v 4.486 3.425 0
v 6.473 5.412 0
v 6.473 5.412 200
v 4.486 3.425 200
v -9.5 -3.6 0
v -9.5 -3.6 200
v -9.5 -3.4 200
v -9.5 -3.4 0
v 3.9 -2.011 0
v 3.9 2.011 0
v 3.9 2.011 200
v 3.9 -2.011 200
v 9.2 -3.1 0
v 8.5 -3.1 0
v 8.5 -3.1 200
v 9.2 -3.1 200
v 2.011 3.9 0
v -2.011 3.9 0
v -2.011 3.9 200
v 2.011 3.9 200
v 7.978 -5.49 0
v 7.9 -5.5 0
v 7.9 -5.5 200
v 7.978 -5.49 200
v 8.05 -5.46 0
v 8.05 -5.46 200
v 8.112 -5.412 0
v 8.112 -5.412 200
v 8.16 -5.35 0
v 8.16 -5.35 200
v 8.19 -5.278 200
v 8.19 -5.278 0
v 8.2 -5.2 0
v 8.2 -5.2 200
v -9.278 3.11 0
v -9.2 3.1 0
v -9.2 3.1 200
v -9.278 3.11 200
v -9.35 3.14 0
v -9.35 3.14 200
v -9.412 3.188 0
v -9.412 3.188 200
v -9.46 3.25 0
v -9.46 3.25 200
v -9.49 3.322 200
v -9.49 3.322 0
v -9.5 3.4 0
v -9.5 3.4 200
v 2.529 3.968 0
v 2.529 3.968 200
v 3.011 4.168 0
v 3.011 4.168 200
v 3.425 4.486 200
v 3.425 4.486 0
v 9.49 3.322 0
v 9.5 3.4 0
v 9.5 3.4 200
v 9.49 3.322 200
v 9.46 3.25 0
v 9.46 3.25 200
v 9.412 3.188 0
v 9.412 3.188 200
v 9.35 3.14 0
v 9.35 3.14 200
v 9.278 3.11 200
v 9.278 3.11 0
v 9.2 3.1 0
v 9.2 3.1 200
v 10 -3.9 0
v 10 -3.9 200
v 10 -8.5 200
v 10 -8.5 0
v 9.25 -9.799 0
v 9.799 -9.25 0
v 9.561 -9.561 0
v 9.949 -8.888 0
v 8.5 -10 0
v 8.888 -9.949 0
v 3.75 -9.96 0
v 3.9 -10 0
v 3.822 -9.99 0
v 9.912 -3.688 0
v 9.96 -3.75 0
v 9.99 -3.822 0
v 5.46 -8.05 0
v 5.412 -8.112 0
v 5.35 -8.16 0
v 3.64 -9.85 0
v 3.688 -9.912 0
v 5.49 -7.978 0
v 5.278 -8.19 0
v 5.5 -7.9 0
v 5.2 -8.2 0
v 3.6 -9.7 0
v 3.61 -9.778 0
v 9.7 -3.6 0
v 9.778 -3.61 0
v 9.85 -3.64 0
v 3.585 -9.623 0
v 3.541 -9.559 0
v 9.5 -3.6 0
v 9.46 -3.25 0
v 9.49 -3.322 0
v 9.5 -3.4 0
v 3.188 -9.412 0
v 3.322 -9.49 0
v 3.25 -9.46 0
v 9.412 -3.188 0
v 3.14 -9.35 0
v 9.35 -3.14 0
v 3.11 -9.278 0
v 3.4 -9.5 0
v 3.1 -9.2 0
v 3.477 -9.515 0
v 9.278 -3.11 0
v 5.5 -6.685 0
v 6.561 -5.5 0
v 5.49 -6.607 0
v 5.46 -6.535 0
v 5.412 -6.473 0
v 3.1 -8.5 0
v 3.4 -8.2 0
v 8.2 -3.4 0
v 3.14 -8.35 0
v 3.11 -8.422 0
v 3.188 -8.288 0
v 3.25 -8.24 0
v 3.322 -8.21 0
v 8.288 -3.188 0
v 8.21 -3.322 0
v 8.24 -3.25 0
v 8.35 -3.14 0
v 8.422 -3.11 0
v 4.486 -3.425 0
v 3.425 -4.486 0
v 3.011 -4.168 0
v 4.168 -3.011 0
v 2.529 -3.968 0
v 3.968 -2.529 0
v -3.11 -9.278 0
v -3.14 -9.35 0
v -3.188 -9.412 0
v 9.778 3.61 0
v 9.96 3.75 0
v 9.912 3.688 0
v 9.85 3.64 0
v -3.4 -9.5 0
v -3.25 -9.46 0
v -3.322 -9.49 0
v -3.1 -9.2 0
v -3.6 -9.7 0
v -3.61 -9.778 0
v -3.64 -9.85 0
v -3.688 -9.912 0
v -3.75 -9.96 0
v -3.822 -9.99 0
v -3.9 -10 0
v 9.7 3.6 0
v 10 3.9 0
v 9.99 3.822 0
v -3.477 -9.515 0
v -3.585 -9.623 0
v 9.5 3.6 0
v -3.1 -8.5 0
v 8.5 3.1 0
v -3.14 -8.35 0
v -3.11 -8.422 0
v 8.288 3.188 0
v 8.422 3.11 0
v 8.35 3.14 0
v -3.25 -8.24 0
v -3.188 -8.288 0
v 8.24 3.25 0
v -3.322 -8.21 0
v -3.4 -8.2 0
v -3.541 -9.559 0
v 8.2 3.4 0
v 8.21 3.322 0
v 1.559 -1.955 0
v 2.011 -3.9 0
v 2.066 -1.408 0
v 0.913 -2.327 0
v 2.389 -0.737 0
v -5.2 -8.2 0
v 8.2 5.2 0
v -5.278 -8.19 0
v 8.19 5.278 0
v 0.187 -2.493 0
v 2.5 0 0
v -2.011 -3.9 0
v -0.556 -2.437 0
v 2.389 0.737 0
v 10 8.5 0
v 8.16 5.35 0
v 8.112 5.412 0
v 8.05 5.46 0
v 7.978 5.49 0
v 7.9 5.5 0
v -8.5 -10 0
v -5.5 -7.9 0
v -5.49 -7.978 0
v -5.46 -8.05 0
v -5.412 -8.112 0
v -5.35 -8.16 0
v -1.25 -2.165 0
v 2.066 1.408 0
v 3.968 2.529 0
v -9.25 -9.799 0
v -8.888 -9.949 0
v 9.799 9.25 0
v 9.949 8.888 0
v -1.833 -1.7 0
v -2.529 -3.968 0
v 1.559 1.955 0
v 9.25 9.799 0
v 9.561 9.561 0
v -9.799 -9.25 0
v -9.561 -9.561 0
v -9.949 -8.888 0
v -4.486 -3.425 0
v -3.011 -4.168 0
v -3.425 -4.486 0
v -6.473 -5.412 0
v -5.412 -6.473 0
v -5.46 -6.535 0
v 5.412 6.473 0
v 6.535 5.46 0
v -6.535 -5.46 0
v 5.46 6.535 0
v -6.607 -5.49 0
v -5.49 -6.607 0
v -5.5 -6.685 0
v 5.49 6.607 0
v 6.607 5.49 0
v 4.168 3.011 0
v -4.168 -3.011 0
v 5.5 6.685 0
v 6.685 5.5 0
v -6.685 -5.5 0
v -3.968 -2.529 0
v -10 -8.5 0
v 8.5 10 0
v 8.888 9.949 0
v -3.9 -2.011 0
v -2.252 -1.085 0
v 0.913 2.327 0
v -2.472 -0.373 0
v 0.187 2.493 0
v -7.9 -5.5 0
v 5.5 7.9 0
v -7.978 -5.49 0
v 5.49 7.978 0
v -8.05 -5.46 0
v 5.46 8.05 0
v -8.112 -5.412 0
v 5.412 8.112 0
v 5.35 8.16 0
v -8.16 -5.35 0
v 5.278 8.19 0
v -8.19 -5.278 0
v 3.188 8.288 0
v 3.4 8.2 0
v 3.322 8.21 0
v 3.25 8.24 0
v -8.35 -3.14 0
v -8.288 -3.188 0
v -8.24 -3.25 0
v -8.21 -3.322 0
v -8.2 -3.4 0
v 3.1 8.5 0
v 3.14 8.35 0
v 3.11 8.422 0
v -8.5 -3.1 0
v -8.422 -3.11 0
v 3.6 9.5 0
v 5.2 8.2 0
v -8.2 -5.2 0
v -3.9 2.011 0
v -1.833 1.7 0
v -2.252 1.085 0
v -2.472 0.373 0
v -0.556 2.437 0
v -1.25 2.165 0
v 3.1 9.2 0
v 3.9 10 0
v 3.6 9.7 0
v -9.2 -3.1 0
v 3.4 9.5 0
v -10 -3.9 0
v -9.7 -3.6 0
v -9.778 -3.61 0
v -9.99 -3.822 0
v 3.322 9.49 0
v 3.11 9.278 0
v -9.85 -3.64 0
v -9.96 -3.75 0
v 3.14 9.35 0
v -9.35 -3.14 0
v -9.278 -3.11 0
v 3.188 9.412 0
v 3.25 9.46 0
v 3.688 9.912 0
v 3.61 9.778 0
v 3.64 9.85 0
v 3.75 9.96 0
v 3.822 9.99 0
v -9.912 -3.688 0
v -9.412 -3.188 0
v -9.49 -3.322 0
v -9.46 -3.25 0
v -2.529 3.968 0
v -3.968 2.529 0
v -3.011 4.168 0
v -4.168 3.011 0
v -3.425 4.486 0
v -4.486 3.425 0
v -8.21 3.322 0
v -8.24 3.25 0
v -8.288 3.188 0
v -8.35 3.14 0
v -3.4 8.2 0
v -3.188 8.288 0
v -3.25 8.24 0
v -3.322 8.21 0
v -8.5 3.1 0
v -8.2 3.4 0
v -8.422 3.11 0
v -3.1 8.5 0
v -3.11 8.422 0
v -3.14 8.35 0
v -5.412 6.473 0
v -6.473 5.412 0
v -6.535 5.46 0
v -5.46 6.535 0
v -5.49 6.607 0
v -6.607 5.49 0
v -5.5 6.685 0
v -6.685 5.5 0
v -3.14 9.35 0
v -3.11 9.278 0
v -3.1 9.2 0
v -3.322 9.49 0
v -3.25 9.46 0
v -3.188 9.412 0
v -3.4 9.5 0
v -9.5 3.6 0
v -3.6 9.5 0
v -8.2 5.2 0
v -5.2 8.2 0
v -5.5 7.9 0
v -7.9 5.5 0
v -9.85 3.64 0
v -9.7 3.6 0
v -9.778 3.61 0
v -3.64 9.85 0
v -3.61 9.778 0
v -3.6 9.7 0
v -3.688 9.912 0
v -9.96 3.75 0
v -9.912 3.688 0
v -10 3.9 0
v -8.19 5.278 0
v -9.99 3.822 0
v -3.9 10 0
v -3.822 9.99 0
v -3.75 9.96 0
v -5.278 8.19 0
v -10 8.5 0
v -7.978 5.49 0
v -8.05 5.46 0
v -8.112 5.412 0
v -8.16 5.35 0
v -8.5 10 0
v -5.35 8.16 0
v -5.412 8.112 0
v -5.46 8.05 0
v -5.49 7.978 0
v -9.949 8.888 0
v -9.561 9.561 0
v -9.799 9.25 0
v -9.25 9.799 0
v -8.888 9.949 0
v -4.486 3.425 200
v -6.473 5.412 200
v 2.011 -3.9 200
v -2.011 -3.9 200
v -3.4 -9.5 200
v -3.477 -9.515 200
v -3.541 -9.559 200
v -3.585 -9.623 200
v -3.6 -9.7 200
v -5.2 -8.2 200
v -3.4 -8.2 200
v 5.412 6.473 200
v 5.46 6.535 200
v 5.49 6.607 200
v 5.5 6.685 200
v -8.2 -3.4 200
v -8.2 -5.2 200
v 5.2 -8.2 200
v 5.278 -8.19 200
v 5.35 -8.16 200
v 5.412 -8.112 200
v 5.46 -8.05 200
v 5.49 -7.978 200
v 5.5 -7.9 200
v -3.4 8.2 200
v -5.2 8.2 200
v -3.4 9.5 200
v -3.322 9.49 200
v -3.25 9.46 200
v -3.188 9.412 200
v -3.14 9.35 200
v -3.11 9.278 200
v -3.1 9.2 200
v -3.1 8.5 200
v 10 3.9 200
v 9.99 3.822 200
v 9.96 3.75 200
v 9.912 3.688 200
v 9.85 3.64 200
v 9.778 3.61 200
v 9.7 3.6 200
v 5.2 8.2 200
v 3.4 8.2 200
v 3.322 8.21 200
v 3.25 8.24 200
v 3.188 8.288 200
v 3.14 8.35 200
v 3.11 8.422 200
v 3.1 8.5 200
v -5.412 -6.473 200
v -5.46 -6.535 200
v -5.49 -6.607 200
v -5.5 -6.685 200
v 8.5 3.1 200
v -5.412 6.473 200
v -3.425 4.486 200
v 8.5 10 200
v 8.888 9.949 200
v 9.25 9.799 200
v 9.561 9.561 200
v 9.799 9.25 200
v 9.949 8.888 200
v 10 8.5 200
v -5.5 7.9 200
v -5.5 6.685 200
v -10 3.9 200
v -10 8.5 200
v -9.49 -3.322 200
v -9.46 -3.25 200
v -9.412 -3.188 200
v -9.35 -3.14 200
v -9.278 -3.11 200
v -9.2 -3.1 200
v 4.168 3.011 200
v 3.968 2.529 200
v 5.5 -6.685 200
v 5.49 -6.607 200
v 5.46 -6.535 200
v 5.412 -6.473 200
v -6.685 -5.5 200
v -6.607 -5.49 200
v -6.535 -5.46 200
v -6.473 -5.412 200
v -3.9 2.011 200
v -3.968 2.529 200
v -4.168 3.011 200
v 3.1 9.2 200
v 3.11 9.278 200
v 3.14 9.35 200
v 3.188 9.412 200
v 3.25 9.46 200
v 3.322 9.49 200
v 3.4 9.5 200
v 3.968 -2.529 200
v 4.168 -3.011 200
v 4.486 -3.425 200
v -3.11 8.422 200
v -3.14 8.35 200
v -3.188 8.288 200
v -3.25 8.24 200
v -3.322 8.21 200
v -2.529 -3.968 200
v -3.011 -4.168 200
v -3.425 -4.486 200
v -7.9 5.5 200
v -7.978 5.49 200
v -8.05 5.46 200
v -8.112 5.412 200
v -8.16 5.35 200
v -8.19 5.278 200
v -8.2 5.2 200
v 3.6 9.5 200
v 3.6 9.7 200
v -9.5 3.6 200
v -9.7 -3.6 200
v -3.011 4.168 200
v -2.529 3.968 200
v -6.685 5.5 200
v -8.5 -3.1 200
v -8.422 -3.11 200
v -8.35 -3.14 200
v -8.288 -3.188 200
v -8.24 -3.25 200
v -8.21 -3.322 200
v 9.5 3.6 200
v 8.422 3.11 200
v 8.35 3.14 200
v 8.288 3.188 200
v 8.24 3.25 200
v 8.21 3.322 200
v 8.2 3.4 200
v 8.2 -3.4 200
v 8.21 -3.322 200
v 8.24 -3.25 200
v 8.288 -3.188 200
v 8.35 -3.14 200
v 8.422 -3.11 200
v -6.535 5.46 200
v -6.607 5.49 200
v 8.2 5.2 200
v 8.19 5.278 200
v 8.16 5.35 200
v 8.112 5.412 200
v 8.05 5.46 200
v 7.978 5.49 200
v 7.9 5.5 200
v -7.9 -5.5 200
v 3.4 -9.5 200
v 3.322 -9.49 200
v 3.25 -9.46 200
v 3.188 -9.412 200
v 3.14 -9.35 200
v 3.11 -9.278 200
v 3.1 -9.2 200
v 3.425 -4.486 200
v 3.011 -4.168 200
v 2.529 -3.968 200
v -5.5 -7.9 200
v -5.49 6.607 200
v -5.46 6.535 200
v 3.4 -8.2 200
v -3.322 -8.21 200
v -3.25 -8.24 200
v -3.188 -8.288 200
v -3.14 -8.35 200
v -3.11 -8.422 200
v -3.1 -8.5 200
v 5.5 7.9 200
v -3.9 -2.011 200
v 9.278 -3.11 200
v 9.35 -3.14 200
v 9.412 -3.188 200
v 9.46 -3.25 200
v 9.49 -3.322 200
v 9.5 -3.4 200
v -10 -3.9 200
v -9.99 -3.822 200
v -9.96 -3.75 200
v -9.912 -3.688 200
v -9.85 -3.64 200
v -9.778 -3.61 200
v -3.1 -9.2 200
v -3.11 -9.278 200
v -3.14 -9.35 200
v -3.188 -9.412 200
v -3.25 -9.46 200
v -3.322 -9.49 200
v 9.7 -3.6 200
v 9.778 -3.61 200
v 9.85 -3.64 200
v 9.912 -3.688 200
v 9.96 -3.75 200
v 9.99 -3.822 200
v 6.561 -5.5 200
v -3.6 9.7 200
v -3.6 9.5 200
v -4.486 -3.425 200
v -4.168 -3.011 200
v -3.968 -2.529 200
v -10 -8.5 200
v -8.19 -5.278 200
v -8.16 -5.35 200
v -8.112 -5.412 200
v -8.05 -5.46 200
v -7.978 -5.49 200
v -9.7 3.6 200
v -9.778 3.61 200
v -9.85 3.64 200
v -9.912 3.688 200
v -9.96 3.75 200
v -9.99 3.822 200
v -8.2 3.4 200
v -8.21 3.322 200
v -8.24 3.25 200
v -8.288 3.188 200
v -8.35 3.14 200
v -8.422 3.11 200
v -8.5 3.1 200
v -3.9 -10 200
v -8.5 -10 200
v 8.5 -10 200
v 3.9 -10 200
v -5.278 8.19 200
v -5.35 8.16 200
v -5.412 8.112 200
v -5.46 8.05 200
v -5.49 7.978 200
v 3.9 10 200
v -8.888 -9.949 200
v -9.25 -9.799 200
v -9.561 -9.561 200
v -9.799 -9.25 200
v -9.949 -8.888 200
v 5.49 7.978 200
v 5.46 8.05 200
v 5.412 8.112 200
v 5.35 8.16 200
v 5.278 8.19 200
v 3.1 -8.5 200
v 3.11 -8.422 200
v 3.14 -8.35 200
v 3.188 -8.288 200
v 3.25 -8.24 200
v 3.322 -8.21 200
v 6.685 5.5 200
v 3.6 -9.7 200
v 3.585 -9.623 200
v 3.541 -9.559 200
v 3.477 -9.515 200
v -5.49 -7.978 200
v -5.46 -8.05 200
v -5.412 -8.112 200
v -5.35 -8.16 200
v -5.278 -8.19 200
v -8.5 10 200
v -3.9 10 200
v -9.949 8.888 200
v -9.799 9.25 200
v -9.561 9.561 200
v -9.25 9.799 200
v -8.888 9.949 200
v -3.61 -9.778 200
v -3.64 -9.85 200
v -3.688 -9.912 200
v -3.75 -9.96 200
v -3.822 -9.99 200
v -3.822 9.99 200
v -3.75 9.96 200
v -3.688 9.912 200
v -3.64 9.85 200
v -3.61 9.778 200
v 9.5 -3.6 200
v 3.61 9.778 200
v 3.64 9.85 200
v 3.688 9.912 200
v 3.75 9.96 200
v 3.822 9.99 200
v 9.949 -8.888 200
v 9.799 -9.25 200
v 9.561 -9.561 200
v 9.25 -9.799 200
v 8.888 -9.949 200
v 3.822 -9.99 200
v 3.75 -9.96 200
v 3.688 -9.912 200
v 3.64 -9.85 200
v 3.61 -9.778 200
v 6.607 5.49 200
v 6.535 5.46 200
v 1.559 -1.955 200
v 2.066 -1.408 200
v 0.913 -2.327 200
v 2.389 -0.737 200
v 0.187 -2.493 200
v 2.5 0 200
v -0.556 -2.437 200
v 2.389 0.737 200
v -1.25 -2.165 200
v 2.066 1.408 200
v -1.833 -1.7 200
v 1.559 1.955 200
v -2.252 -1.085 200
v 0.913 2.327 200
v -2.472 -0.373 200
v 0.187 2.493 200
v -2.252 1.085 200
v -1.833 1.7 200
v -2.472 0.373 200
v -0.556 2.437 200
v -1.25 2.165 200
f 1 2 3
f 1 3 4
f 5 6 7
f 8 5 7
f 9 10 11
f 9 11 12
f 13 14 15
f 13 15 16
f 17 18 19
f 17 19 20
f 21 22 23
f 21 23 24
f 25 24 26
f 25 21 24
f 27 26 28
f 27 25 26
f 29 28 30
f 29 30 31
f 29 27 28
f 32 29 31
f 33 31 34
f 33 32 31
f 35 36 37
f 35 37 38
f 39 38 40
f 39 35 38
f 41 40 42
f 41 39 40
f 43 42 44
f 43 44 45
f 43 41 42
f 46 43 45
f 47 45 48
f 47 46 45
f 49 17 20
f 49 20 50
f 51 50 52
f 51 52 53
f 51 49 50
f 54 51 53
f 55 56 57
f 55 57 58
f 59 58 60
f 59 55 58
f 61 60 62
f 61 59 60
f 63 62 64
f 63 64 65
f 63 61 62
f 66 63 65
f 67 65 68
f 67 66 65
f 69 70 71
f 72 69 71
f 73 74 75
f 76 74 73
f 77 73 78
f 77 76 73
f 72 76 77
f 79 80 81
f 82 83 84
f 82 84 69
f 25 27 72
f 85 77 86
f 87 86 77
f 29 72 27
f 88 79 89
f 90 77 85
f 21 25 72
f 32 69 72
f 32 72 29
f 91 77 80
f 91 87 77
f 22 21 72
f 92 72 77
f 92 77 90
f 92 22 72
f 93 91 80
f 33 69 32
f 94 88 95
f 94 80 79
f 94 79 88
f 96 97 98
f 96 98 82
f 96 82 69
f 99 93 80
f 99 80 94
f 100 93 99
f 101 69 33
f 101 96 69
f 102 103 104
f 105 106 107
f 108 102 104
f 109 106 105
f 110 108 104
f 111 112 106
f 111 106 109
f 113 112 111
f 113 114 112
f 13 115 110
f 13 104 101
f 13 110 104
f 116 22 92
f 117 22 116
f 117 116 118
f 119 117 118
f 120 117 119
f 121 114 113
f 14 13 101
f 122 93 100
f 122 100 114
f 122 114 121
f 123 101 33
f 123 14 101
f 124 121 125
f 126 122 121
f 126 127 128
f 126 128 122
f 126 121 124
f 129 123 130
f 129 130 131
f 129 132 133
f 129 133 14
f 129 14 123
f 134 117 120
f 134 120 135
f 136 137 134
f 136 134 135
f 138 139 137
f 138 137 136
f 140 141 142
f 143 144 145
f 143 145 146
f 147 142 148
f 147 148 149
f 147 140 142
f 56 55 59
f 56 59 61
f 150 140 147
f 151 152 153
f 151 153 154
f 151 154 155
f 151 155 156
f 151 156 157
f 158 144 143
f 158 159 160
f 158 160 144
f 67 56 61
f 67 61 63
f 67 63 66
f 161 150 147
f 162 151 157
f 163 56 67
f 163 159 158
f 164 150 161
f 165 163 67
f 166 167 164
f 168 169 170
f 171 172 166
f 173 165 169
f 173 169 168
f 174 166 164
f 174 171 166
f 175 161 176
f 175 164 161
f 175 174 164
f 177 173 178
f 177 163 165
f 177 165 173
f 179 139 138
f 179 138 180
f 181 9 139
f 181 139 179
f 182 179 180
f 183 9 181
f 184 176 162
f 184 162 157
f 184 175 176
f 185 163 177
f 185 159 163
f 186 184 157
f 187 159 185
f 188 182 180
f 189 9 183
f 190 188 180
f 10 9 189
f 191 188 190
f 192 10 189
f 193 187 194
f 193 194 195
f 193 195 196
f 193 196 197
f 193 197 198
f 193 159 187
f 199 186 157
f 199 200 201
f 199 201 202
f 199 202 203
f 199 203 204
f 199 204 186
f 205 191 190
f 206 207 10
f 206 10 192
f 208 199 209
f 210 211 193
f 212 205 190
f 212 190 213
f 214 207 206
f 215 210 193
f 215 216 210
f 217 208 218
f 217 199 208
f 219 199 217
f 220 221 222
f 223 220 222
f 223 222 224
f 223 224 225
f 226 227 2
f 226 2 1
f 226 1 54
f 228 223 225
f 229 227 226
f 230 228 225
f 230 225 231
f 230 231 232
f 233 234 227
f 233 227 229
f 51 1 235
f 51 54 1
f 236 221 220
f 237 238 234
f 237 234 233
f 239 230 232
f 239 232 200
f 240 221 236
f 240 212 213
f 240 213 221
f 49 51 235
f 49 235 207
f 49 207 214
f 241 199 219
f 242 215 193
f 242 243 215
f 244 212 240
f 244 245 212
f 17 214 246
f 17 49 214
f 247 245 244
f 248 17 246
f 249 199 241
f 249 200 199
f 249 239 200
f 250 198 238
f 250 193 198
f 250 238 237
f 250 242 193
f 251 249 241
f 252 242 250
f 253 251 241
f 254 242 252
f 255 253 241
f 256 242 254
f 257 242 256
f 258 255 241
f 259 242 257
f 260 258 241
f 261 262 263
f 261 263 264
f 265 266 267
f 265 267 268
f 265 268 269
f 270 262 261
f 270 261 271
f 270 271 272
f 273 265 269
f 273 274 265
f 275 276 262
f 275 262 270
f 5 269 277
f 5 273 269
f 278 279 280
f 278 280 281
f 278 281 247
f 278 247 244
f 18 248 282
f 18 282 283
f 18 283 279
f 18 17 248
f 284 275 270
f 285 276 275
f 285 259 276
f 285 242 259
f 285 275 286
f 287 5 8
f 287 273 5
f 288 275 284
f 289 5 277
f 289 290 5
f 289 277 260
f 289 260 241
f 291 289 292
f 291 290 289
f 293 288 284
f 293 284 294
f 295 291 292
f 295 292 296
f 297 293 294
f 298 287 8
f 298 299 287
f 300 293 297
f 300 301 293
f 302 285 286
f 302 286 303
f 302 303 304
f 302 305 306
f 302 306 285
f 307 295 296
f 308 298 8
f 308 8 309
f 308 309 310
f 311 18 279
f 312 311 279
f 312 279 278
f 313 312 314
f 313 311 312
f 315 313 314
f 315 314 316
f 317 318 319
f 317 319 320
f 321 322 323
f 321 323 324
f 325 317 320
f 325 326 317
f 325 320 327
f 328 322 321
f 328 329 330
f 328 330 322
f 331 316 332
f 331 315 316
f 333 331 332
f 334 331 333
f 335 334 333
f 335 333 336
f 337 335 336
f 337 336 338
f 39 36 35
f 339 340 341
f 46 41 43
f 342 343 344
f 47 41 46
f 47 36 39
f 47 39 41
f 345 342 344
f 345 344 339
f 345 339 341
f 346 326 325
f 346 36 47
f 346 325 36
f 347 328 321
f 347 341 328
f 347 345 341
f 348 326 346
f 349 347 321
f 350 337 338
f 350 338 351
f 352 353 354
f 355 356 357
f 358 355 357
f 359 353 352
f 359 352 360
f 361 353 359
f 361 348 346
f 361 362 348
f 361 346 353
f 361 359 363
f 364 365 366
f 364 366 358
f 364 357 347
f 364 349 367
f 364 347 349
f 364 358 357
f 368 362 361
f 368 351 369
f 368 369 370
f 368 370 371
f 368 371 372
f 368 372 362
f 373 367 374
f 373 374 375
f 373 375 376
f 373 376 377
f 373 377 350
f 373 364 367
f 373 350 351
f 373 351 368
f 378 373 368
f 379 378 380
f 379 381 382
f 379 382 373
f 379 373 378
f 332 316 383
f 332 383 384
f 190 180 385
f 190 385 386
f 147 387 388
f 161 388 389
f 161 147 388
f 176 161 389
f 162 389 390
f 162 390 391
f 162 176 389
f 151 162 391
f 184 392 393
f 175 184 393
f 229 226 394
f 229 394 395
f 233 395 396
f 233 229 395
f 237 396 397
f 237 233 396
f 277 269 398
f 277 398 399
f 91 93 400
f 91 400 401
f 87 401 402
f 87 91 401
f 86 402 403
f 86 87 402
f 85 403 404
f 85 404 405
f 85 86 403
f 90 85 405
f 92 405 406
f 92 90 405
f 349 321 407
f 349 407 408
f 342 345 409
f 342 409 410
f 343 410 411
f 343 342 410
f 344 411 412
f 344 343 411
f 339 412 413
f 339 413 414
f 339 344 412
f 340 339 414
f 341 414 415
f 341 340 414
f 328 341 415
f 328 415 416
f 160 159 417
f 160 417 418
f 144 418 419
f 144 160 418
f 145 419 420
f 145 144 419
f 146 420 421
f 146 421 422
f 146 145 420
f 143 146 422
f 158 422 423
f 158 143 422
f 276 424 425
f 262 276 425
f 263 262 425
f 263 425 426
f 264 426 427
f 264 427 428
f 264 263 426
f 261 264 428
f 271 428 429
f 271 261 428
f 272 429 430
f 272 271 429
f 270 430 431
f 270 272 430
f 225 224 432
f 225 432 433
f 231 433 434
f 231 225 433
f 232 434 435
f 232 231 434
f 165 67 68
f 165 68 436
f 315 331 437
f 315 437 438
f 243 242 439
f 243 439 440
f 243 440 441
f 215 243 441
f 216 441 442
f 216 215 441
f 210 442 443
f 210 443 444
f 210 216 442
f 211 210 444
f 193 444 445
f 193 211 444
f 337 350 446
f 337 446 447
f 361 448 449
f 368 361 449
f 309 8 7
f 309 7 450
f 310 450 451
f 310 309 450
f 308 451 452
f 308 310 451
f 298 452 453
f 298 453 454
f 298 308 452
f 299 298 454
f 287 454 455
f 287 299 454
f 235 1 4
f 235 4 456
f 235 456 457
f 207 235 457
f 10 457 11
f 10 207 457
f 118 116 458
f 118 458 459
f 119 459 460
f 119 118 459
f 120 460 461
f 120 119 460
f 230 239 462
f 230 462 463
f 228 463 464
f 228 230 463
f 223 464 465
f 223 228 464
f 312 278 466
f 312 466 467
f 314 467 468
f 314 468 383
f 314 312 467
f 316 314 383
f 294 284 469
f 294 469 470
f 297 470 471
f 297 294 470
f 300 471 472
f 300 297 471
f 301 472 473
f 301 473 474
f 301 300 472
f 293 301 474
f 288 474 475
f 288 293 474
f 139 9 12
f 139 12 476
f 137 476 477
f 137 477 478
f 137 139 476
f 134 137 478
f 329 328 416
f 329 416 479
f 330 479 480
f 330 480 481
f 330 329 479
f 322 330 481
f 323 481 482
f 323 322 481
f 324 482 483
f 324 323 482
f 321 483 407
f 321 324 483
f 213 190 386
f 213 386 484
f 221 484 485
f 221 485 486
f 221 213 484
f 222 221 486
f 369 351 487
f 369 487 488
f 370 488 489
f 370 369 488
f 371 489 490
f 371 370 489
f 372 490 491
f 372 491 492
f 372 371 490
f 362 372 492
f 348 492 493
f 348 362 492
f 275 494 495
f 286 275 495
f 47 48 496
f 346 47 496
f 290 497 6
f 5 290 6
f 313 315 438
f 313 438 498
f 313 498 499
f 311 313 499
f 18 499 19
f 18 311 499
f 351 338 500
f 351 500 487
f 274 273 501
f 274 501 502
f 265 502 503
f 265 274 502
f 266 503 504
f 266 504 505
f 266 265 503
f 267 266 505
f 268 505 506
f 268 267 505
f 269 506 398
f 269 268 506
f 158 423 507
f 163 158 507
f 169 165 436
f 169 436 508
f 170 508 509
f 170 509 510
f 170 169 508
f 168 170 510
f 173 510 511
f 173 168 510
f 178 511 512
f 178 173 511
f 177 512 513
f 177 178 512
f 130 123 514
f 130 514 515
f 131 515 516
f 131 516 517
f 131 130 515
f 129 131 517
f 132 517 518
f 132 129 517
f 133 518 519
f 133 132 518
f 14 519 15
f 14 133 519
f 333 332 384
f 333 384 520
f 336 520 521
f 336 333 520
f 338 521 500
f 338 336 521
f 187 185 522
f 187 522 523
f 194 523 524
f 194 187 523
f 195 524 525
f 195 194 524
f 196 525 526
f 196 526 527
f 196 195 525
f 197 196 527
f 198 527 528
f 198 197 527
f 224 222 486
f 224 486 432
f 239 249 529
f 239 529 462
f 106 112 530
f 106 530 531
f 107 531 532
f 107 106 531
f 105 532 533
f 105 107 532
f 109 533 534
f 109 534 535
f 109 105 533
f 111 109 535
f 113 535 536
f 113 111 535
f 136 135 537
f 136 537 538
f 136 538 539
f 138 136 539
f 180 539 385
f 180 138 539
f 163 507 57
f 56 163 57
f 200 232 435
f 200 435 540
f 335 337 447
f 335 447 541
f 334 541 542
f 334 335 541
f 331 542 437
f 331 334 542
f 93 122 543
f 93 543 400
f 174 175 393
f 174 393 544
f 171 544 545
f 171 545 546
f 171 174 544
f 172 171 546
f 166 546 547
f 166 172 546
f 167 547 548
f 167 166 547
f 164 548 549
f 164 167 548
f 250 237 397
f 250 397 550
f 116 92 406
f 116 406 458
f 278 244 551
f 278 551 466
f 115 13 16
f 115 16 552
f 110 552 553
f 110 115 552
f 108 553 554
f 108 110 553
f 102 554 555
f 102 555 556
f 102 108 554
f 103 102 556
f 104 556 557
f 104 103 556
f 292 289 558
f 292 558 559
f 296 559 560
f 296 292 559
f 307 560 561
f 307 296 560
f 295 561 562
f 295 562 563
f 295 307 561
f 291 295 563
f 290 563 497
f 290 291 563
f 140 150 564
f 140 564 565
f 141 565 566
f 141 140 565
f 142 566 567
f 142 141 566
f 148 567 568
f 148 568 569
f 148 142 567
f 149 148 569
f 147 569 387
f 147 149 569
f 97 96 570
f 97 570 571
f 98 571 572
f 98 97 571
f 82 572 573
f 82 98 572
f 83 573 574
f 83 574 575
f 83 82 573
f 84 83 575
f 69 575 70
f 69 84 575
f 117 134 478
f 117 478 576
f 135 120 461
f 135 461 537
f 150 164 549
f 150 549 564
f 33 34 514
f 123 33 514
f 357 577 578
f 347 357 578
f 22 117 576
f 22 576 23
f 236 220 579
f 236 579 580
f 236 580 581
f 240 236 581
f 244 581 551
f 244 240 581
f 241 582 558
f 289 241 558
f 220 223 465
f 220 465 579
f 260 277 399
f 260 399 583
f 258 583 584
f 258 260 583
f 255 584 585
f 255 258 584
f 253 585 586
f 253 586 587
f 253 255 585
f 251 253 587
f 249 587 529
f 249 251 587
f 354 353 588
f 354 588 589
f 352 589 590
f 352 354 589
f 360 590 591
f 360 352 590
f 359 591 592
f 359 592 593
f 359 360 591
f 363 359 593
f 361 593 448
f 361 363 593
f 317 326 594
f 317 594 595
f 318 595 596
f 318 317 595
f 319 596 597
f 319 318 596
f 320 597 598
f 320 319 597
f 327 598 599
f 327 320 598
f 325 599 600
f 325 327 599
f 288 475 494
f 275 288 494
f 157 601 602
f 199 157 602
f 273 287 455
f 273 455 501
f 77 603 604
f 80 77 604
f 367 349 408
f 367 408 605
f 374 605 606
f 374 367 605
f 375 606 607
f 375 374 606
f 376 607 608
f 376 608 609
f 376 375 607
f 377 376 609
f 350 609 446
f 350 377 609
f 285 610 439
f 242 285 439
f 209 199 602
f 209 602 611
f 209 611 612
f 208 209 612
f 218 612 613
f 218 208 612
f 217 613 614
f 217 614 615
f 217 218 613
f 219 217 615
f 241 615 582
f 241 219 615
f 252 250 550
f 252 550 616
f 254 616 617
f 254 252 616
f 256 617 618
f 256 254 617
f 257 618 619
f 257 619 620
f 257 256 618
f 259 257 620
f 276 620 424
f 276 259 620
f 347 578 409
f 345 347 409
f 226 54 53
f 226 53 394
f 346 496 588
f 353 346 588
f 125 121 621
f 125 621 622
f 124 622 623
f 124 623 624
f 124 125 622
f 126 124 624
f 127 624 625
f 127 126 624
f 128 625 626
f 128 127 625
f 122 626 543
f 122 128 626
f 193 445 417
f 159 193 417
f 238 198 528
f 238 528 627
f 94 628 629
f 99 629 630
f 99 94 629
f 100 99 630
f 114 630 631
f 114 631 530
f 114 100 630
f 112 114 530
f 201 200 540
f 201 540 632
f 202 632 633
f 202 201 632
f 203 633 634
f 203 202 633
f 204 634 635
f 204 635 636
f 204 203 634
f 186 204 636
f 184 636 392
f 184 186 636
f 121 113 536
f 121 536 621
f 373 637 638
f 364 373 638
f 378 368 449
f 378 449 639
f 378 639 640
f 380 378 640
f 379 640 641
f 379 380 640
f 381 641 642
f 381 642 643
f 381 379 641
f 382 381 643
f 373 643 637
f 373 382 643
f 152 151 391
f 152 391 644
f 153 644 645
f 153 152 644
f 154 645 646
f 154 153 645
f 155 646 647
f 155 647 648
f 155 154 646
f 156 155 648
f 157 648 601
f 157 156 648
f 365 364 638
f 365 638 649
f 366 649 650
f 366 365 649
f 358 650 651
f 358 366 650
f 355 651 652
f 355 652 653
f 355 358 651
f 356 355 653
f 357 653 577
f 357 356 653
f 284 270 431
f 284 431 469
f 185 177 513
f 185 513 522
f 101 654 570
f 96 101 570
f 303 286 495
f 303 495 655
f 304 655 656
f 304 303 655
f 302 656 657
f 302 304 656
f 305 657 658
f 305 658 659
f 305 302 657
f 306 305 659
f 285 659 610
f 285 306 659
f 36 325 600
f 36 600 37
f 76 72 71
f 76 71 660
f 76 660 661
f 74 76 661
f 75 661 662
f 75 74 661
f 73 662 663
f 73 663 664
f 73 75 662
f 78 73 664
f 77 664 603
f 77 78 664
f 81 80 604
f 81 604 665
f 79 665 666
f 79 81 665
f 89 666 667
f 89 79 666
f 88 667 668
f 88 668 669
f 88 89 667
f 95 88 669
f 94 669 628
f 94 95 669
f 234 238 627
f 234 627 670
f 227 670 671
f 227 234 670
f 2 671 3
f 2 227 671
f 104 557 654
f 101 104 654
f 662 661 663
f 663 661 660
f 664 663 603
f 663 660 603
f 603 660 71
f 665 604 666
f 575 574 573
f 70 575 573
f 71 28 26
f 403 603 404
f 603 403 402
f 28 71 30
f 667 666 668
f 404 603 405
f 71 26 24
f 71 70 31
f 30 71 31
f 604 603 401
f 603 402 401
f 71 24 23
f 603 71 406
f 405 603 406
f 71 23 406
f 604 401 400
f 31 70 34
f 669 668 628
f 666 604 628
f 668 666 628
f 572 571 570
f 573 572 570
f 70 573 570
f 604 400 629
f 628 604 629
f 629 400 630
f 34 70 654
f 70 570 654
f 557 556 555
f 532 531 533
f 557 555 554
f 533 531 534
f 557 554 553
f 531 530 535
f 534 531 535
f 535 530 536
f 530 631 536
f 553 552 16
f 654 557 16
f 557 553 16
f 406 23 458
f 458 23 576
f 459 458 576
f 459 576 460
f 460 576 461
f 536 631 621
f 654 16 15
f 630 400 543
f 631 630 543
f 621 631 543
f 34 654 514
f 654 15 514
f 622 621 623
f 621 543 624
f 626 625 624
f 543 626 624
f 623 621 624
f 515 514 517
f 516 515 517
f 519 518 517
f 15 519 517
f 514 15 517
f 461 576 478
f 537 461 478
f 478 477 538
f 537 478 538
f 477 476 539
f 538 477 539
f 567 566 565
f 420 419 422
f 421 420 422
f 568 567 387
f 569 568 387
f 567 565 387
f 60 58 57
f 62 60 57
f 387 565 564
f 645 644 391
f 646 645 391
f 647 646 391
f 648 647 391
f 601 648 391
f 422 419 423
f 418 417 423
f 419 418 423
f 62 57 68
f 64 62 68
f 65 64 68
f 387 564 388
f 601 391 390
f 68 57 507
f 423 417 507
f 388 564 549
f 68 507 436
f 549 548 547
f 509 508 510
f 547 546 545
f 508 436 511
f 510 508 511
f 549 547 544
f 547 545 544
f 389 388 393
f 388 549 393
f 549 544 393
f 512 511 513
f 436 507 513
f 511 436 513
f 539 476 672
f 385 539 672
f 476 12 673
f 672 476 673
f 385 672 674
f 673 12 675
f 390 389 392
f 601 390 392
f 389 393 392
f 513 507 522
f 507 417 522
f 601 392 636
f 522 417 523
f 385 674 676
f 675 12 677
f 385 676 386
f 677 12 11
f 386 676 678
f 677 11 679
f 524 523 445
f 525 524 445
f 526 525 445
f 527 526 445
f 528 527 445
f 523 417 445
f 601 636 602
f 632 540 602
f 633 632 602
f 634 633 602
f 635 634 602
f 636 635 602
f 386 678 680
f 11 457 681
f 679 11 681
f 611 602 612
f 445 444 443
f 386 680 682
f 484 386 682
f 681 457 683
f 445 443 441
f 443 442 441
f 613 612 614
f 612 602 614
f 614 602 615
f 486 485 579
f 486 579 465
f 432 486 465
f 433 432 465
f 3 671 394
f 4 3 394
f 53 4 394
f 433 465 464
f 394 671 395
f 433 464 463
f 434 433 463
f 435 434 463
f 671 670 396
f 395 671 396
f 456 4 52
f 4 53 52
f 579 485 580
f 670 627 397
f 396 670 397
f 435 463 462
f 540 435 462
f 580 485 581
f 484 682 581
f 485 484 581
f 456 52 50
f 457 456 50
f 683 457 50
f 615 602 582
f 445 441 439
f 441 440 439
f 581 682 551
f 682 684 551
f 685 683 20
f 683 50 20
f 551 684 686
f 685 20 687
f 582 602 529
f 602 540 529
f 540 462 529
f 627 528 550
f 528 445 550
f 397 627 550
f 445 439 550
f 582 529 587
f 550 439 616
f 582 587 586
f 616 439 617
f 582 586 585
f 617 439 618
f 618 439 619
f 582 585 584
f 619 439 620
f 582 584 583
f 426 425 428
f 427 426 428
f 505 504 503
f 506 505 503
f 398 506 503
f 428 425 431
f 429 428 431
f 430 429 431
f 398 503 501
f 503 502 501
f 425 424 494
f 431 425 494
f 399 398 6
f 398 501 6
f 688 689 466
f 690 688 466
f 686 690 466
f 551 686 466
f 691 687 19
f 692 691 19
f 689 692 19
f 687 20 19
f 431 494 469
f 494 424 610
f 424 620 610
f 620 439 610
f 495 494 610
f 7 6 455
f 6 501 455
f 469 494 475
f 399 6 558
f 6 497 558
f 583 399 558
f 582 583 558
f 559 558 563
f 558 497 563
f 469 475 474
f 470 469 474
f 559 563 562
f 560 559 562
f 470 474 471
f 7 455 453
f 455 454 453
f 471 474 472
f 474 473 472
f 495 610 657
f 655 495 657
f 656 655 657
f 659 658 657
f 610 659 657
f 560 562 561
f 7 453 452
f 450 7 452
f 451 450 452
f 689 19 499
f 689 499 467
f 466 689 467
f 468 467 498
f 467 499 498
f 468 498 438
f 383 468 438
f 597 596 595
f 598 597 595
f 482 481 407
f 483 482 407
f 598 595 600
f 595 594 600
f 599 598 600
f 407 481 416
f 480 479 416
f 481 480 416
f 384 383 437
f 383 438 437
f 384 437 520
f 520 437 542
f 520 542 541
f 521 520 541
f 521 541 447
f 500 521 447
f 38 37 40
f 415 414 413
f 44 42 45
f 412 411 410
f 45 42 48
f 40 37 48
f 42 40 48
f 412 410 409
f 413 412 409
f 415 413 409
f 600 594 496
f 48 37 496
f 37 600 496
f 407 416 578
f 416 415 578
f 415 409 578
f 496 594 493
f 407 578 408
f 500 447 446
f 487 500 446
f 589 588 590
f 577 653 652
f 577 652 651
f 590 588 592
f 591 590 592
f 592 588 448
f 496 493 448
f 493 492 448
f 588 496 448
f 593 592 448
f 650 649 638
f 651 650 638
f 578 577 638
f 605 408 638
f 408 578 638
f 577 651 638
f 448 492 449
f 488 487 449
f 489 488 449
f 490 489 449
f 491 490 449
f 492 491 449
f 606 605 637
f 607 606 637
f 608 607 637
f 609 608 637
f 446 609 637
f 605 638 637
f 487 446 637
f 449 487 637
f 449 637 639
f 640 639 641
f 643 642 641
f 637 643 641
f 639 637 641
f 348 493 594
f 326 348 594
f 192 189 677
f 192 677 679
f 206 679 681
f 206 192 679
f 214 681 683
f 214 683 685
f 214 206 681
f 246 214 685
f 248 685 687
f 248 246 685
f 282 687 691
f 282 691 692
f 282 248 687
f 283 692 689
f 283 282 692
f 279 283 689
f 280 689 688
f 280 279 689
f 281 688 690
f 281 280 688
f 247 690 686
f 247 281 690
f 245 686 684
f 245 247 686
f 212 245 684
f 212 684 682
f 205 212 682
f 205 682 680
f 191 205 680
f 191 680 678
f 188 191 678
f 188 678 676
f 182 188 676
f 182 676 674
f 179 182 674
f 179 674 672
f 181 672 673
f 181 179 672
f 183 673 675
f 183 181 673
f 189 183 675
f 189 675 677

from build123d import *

# Parameters (mm, degrees)
SKETCH_1_R      = 2.5
EXTRUDE_1_DEPTH = 200


with BuildPart() as part:
    # 草图1 → 凸台-拉伸1 (new body)
    with BuildSketch(Plane.XY):
        with BuildLine():
            Line((3.9, 0), (3.9, -2.010912703))
            ThreePointArc((3.9, -2.010912703), (4.052240935, -2.776279568), (4.485786438, -3.425126266))
            Line((4.485786438, -3.425126266), (6.560660172, -5.5))
            Line((6.560660172, -5.5), (7.9, -5.5))
            ThreePointArc((7.9, -5.5), (8.112132034, -5.412132034), (8.2, -5.2))
            Line((8.2, -5.2), (8.2, -3.4))
            ThreePointArc((8.2, -3.4), (8.287867966, -3.187867966), (8.5, -3.1))
            Line((8.5, -3.1), (9.2, -3.1))
            ThreePointArc((9.2, -3.1), (9.412132034, -3.187867966), (9.5, -3.4))
            Line((9.5, -3.4), (9.5, -3.6))
            Line((9.5, -3.6), (9.7, -3.6))
            ThreePointArc((9.7, -3.6), (9.912132034, -3.687867966), (10, -3.9))
            Line((10, -3.9), (10, -8.5))
            ThreePointArc((10, -8.5), (9.560660172, -9.560660172), (8.5, -10))
            Line((8.5, -10), (3.9, -10))
            ThreePointArc((3.9, -10), (3.687867966, -9.912132034), (3.6, -9.7))
            ThreePointArc((3.6, -9.7), (3.541421356, -9.558578644), (3.4, -9.5))
            ThreePointArc((3.4, -9.5), (3.187867966, -9.412132034), (3.1, -9.2))
            Line((3.1, -9.2), (3.1, -8.5))
            ThreePointArc((3.1, -8.5), (3.187867966, -8.287867966), (3.4, -8.2))
            Line((3.4, -8.2), (5.2, -8.2))
            ThreePointArc((5.2, -8.2), (5.412132034, -8.112132034), (5.5, -7.9))
            Line((5.5, -7.9), (5.5, -6.68492424))
            ThreePointArc((5.5, -6.68492424), (5.47716386, -6.570119211), (5.412132034, -6.472792206))
            Line((5.412132034, -6.472792206), (3.425126266, -4.485786438))
            ThreePointArc((3.425126266, -4.485786438), (2.776279568, -4.052240935), (2.010912703, -3.9))
            Line((2.010912703, -3.9), (0, -3.9))
            Line((0, -3.9), (-2.010912703, -3.9))
            ThreePointArc((-2.010912703, -3.9), (-2.776279568, -4.052240935), (-3.425126266, -4.485786438))
            Line((-3.425126266, -4.485786438), (-5.412132034, -6.472792206))
            ThreePointArc((-5.412132034, -6.472792206), (-5.47716386, -6.570119211), (-5.5, -6.68492424))
            Line((-5.5, -6.68492424), (-5.5, -7.9))
            ThreePointArc((-5.5, -7.9), (-5.412132034, -8.112132034), (-5.2, -8.2))
            Line((-5.2, -8.2), (-3.4, -8.2))
            ThreePointArc((-3.4, -8.2), (-3.187867966, -8.287867966), (-3.1, -8.5))
            Line((-3.1, -8.5), (-3.1, -9.2))
            ThreePointArc((-3.1, -9.2), (-3.187867966, -9.412132034), (-3.4, -9.5))
            ThreePointArc((-3.4, -9.5), (-3.541421356, -9.558578644), (-3.6, -9.7))
            ThreePointArc((-3.6, -9.7), (-3.687867966, -9.912132034), (-3.9, -10))
            Line((-3.9, -10), (-8.5, -10))
            ThreePointArc((-8.5, -10), (-9.560660172, -9.560660172), (-10, -8.5))
            Line((-10, -8.5), (-10, -3.9))
            ThreePointArc((-10, -3.9), (-9.912132034, -3.687867966), (-9.7, -3.6))
            Line((-9.7, -3.6), (-9.5, -3.6))
            Line((-9.5, -3.6), (-9.5, -3.4))
            ThreePointArc((-9.5, -3.4), (-9.412132034, -3.187867966), (-9.2, -3.1))
            Line((-9.2, -3.1), (-8.5, -3.1))
            ThreePointArc((-8.5, -3.1), (-8.287867965, -3.187867966), (-8.2, -3.4))
            Line((-8.2, -3.4), (-8.2, -5.2))
            ThreePointArc((-8.2, -5.2), (-8.112132034, -5.412132034), (-7.9, -5.5))
            Line((-7.9, -5.5), (-6.68492424, -5.5))
            ThreePointArc((-6.68492424, -5.5), (-6.570119211, -5.47716386), (-6.472792206, -5.412132034))
            Line((-6.472792206, -5.412132034), (-4.485786438, -3.425126266))
            ThreePointArc((-4.485786438, -3.425126266), (-4.052240935, -2.776279568), (-3.9, -2.010912703))
            Line((-3.9, -2.010912703), (-3.9, 0))
            Line((-3.9, 0), (-3.9, 2.010912703))
            ThreePointArc((-3.9, 2.010912703), (-4.052240935, 2.776279568), (-4.485786438, 3.425126266))
            Line((-4.485786438, 3.425126266), (-6.472792206, 5.412132034))
            ThreePointArc((-6.472792206, 5.412132034), (-6.570119211, 5.47716386), (-6.68492424, 5.5))
            Line((-6.68492424, 5.5), (-7.9, 5.5))
            ThreePointArc((-7.9, 5.5), (-8.112132034, 5.412132034), (-8.2, 5.2))
            Line((-8.2, 5.2), (-8.2, 3.4))
            ThreePointArc((-8.2, 3.4), (-8.287867965, 3.187867966), (-8.5, 3.1))
            Line((-8.5, 3.1), (-9.2, 3.1))
            ThreePointArc((-9.2, 3.1), (-9.412132034, 3.187867966), (-9.5, 3.4))
            Line((-9.5, 3.4), (-9.5, 3.6))
            Line((-9.5, 3.6), (-9.7, 3.6))
            ThreePointArc((-9.7, 3.6), (-9.912132034, 3.687867966), (-10, 3.9))
            Line((-10, 3.9), (-10, 8.5))
            ThreePointArc((-10, 8.5), (-9.560660172, 9.560660172), (-8.5, 10))
            Line((-8.5, 10), (-3.9, 10))
            ThreePointArc((-3.9, 10), (-3.687867966, 9.912132034), (-3.6, 9.7))
            Line((-3.6, 9.7), (-3.6, 9.5))
            Line((-3.6, 9.5), (-3.4, 9.5))
            ThreePointArc((-3.4, 9.5), (-3.187867966, 9.412132034), (-3.1, 9.2))
            Line((-3.1, 9.2), (-3.1, 8.5))
            ThreePointArc((-3.1, 8.5), (-3.187867966, 8.287867966), (-3.4, 8.2))
            Line((-3.4, 8.2), (-5.2, 8.2))
            ThreePointArc((-5.2, 8.2), (-5.412132034, 8.112132034), (-5.5, 7.9))
            Line((-5.5, 7.9), (-5.5, 6.68492424))
            ThreePointArc((-5.5, 6.68492424), (-5.47716386, 6.570119211), (-5.412132034, 6.472792206))
            Line((-5.412132034, 6.472792206), (-3.425126266, 4.485786438))
            ThreePointArc((-3.425126266, 4.485786438), (-2.776279568, 4.052240935), (-2.010912703, 3.9))
            Line((-2.010912703, 3.9), (0, 3.9))
            Line((0, 3.9), (2.010912703, 3.9))
            ThreePointArc((2.010912703, 3.9), (2.776279568, 4.052240935), (3.425126266, 4.485786438))
            Line((3.425126266, 4.485786438), (5.412132034, 6.472792206))
            ThreePointArc((5.412132034, 6.472792206), (5.47716386, 6.570119211), (5.5, 6.68492424))
            Line((5.5, 6.68492424), (5.5, 7.9))
            ThreePointArc((5.5, 7.9), (5.412132034, 8.112132034), (5.2, 8.2))
            Line((5.2, 8.2), (3.4, 8.2))
            ThreePointArc((3.4, 8.2), (3.187867966, 8.287867966), (3.1, 8.5))
            Line((3.1, 8.5), (3.1, 9.2))
            ThreePointArc((3.1, 9.2), (3.187867966, 9.412132034), (3.4, 9.5))
            Line((3.4, 9.5), (3.6, 9.5))
            Line((3.6, 9.5), (3.6, 9.7))
            ThreePointArc((3.6, 9.7), (3.687867966, 9.912132034), (3.9, 10))
            Line((3.9, 10), (8.5, 10))
            ThreePointArc((8.5, 10), (9.560660172, 9.560660172), (10, 8.5))
            Line((10, 8.5), (10, 3.9))
            ThreePointArc((10, 3.9), (9.912132034, 3.687867966), (9.7, 3.6))
            Line((9.7, 3.6), (9.5, 3.6))
            Line((9.5, 3.6), (9.5, 3.4))
            ThreePointArc((9.5, 3.4), (9.412132034, 3.187867966), (9.2, 3.1))
            Line((9.2, 3.1), (8.5, 3.1))
            ThreePointArc((8.5, 3.1), (8.287867966, 3.187867966), (8.2, 3.4))
            Line((8.2, 3.4), (8.2, 5.2))
            ThreePointArc((8.2, 5.2), (8.112132034, 5.412132034), (7.9, 5.5))
            Line((7.9, 5.5), (6.68492424, 5.5))
            ThreePointArc((6.68492424, 5.5), (6.570119211, 5.47716386), (6.472792206, 5.412132034))
            Line((6.472792206, 5.412132034), (4.485786438, 3.425126266))
            ThreePointArc((4.485786438, 3.425126266), (4.052240935, 2.776279568), (3.9, 2.010912703))
            Line((3.9, 2.010912703), (3.9, 0))
        make_face()
        Circle(SKETCH_1_R, mode=Mode.SUBTRACT)
    extrude(amount=EXTRUDE_1_DEPTH)


solid = part.part
